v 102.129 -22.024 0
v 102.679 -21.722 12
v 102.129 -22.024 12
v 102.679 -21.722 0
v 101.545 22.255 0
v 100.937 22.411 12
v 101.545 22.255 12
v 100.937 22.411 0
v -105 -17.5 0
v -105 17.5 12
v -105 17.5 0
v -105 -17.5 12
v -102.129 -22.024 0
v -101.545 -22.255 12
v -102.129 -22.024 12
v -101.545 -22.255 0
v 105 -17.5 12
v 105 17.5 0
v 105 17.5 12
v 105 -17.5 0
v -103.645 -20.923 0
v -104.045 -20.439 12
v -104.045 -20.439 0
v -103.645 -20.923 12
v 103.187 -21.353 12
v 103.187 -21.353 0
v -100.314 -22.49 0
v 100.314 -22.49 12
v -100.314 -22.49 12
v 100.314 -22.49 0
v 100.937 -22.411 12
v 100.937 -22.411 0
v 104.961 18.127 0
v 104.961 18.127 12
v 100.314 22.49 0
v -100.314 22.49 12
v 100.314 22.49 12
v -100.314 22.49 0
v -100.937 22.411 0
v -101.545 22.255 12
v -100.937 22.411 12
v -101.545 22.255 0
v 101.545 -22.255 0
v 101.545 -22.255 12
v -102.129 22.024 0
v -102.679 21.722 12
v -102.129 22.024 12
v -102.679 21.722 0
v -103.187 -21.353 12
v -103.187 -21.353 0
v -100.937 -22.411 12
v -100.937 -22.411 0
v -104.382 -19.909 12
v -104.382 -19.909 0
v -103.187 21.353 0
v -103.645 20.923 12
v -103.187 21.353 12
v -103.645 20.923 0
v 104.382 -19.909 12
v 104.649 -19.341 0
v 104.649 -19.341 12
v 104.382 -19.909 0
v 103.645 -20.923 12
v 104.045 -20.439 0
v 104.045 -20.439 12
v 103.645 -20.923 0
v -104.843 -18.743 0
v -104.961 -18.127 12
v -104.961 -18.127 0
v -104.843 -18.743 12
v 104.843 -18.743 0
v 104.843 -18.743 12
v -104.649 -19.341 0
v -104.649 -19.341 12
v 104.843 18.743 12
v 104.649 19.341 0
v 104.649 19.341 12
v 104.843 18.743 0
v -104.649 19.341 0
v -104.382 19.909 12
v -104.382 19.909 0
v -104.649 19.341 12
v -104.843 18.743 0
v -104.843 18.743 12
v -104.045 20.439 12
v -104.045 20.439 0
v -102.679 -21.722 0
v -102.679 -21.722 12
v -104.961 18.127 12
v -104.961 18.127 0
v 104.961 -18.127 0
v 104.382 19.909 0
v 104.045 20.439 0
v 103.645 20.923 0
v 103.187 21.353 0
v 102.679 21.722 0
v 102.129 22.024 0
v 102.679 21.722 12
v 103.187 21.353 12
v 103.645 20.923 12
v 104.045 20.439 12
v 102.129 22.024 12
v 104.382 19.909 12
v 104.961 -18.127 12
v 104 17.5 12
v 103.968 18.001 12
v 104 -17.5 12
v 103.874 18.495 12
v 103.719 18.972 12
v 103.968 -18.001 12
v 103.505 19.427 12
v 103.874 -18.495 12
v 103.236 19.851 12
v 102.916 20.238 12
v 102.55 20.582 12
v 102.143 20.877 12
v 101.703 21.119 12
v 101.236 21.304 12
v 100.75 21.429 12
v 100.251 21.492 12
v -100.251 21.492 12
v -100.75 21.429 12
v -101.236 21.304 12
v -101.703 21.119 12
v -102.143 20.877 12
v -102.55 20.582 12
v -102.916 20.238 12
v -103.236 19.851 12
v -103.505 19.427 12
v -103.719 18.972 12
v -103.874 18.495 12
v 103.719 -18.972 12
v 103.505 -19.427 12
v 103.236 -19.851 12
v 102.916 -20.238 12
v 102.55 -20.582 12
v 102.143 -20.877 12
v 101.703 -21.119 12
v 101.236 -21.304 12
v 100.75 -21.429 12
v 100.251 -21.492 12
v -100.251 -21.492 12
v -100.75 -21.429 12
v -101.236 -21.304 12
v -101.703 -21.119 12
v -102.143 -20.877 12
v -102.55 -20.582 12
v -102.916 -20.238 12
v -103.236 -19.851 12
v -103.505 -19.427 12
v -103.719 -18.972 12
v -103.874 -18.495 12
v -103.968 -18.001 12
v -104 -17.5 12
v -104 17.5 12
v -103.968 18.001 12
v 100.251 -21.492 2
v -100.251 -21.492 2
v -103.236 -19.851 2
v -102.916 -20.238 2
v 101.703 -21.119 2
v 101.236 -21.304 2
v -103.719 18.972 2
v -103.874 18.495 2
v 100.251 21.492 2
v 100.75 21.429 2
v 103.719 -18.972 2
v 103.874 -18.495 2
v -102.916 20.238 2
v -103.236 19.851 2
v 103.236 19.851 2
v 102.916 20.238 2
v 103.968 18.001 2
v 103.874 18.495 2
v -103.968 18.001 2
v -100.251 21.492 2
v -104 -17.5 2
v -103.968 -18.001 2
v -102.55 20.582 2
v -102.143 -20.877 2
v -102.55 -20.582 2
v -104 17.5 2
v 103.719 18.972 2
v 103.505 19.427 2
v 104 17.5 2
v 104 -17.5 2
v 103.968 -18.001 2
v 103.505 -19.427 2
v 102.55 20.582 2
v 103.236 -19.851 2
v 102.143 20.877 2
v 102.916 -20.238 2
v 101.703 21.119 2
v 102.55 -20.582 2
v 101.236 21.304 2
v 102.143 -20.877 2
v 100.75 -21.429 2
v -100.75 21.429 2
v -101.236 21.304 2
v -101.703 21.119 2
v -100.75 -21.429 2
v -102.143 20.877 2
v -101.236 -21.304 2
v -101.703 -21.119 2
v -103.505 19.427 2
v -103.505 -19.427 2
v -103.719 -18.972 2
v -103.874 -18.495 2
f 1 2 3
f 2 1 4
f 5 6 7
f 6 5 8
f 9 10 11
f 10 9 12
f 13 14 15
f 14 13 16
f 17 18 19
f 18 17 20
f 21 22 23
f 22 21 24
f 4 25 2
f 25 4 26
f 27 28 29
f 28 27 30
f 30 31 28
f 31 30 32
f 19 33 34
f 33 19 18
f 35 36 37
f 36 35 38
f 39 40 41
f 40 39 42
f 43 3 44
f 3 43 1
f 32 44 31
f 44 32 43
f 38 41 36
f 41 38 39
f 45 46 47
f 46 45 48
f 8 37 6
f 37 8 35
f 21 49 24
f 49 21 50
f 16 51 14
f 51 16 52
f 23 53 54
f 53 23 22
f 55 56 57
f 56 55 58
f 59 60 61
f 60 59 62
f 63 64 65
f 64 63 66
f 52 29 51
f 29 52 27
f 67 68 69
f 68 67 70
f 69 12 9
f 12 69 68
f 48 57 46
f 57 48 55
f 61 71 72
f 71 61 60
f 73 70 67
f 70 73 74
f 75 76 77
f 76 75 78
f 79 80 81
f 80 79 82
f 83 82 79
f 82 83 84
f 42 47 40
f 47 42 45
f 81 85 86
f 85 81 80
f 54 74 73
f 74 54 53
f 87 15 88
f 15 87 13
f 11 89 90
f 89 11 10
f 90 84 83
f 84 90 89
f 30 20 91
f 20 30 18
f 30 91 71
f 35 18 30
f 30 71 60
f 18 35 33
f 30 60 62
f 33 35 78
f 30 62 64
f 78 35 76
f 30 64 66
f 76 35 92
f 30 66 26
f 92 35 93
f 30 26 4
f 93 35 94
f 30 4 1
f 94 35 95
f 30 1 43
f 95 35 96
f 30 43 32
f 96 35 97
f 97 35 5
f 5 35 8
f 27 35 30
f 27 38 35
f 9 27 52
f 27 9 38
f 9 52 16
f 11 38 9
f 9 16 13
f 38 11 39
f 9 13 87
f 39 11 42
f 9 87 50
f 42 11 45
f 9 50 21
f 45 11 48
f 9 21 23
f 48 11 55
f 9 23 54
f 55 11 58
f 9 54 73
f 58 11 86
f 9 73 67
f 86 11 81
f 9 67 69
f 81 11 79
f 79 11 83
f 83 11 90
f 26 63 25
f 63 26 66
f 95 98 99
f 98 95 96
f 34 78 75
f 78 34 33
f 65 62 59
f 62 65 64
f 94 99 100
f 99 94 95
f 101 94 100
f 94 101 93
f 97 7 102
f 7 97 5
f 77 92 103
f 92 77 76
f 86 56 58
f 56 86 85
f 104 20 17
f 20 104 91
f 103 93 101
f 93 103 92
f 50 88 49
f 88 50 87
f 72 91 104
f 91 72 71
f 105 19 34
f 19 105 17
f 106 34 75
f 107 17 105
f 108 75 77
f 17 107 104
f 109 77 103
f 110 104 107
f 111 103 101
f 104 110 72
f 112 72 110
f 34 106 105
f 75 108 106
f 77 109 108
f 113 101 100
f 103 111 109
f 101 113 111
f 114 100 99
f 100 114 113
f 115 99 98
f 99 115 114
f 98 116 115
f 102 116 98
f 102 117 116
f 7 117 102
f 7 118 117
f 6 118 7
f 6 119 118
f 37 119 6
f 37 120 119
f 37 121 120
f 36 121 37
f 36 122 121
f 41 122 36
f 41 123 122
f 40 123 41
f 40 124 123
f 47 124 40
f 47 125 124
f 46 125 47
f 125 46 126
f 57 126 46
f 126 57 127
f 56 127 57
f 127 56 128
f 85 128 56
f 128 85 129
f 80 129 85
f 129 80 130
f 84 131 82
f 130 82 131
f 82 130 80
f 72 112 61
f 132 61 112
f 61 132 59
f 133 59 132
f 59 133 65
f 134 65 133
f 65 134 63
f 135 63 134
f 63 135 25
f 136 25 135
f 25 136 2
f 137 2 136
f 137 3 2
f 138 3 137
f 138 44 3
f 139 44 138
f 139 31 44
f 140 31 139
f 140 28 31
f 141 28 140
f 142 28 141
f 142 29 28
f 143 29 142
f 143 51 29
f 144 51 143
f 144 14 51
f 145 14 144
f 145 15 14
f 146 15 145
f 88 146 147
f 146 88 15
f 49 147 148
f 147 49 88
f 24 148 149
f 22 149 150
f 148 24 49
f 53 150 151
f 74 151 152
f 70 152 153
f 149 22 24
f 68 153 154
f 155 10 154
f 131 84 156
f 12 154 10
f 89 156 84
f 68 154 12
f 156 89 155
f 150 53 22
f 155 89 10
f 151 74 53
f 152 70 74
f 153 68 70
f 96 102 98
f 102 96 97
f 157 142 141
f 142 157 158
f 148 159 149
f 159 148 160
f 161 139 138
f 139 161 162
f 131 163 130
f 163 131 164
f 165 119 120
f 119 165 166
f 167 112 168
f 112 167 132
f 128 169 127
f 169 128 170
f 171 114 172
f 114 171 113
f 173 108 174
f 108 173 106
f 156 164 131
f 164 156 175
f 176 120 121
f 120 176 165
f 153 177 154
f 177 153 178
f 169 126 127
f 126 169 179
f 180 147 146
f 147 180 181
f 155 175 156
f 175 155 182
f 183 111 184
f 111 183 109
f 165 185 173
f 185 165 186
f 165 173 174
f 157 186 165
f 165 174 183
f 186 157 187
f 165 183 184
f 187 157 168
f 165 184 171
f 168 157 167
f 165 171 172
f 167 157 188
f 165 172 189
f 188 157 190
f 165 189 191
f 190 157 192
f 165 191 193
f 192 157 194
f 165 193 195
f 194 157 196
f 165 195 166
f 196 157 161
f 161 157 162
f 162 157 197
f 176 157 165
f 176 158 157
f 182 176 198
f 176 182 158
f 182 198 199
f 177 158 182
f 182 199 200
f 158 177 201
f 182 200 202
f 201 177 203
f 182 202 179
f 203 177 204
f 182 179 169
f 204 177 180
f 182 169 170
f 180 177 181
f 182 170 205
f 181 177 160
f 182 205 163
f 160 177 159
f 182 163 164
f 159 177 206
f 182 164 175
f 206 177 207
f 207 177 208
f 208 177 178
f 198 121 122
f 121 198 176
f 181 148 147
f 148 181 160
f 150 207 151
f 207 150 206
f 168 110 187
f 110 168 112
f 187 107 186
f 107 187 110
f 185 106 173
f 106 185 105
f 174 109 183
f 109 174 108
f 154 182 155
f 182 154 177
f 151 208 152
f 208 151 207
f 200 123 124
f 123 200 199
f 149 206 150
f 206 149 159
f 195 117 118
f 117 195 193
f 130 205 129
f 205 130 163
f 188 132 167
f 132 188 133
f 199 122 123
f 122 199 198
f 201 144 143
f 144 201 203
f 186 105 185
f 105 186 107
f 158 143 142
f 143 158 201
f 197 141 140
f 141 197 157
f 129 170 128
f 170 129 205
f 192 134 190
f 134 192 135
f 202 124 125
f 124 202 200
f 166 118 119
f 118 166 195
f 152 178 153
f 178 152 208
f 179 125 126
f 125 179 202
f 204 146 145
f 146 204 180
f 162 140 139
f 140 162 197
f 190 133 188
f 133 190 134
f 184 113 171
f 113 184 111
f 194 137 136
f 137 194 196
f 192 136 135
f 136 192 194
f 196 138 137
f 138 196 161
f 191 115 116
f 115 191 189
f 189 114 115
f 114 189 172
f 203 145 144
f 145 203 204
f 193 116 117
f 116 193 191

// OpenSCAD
$fn = 50;


difference() {
	union() {
		hull() {
			translate(v = [-100.0000000000, 17.5000000000, 0]) {
				cylinder(h = 12, r = 5);
			}
			translate(v = [100.0000000000, 17.5000000000, 0]) {
				cylinder(h = 12, r = 5);
			}
			translate(v = [-100.0000000000, -17.5000000000, 0]) {
				cylinder(h = 12, r = 5);
			}
			translate(v = [100.0000000000, -17.5000000000, 0]) {
				cylinder(h = 12, r = 5);
			}
		}
	}
	union() {
		translate(v = [0, 0, 2]) {
			hull() {
				translate(v = [-100.0000000000, 17.5000000000, 0]) {
					cylinder(h = 10, r = 4);
				}
				translate(v = [100.0000000000, 17.5000000000, 0]) {
					cylinder(h = 10, r = 4);
				}
				translate(v = [-100.0000000000, -17.5000000000, 0]) {
					cylinder(h = 10, r = 4);
				}
				translate(v = [100.0000000000, -17.5000000000, 0]) {
					cylinder(h = 10, r = 4);
				}
			}
		}
	}
}
